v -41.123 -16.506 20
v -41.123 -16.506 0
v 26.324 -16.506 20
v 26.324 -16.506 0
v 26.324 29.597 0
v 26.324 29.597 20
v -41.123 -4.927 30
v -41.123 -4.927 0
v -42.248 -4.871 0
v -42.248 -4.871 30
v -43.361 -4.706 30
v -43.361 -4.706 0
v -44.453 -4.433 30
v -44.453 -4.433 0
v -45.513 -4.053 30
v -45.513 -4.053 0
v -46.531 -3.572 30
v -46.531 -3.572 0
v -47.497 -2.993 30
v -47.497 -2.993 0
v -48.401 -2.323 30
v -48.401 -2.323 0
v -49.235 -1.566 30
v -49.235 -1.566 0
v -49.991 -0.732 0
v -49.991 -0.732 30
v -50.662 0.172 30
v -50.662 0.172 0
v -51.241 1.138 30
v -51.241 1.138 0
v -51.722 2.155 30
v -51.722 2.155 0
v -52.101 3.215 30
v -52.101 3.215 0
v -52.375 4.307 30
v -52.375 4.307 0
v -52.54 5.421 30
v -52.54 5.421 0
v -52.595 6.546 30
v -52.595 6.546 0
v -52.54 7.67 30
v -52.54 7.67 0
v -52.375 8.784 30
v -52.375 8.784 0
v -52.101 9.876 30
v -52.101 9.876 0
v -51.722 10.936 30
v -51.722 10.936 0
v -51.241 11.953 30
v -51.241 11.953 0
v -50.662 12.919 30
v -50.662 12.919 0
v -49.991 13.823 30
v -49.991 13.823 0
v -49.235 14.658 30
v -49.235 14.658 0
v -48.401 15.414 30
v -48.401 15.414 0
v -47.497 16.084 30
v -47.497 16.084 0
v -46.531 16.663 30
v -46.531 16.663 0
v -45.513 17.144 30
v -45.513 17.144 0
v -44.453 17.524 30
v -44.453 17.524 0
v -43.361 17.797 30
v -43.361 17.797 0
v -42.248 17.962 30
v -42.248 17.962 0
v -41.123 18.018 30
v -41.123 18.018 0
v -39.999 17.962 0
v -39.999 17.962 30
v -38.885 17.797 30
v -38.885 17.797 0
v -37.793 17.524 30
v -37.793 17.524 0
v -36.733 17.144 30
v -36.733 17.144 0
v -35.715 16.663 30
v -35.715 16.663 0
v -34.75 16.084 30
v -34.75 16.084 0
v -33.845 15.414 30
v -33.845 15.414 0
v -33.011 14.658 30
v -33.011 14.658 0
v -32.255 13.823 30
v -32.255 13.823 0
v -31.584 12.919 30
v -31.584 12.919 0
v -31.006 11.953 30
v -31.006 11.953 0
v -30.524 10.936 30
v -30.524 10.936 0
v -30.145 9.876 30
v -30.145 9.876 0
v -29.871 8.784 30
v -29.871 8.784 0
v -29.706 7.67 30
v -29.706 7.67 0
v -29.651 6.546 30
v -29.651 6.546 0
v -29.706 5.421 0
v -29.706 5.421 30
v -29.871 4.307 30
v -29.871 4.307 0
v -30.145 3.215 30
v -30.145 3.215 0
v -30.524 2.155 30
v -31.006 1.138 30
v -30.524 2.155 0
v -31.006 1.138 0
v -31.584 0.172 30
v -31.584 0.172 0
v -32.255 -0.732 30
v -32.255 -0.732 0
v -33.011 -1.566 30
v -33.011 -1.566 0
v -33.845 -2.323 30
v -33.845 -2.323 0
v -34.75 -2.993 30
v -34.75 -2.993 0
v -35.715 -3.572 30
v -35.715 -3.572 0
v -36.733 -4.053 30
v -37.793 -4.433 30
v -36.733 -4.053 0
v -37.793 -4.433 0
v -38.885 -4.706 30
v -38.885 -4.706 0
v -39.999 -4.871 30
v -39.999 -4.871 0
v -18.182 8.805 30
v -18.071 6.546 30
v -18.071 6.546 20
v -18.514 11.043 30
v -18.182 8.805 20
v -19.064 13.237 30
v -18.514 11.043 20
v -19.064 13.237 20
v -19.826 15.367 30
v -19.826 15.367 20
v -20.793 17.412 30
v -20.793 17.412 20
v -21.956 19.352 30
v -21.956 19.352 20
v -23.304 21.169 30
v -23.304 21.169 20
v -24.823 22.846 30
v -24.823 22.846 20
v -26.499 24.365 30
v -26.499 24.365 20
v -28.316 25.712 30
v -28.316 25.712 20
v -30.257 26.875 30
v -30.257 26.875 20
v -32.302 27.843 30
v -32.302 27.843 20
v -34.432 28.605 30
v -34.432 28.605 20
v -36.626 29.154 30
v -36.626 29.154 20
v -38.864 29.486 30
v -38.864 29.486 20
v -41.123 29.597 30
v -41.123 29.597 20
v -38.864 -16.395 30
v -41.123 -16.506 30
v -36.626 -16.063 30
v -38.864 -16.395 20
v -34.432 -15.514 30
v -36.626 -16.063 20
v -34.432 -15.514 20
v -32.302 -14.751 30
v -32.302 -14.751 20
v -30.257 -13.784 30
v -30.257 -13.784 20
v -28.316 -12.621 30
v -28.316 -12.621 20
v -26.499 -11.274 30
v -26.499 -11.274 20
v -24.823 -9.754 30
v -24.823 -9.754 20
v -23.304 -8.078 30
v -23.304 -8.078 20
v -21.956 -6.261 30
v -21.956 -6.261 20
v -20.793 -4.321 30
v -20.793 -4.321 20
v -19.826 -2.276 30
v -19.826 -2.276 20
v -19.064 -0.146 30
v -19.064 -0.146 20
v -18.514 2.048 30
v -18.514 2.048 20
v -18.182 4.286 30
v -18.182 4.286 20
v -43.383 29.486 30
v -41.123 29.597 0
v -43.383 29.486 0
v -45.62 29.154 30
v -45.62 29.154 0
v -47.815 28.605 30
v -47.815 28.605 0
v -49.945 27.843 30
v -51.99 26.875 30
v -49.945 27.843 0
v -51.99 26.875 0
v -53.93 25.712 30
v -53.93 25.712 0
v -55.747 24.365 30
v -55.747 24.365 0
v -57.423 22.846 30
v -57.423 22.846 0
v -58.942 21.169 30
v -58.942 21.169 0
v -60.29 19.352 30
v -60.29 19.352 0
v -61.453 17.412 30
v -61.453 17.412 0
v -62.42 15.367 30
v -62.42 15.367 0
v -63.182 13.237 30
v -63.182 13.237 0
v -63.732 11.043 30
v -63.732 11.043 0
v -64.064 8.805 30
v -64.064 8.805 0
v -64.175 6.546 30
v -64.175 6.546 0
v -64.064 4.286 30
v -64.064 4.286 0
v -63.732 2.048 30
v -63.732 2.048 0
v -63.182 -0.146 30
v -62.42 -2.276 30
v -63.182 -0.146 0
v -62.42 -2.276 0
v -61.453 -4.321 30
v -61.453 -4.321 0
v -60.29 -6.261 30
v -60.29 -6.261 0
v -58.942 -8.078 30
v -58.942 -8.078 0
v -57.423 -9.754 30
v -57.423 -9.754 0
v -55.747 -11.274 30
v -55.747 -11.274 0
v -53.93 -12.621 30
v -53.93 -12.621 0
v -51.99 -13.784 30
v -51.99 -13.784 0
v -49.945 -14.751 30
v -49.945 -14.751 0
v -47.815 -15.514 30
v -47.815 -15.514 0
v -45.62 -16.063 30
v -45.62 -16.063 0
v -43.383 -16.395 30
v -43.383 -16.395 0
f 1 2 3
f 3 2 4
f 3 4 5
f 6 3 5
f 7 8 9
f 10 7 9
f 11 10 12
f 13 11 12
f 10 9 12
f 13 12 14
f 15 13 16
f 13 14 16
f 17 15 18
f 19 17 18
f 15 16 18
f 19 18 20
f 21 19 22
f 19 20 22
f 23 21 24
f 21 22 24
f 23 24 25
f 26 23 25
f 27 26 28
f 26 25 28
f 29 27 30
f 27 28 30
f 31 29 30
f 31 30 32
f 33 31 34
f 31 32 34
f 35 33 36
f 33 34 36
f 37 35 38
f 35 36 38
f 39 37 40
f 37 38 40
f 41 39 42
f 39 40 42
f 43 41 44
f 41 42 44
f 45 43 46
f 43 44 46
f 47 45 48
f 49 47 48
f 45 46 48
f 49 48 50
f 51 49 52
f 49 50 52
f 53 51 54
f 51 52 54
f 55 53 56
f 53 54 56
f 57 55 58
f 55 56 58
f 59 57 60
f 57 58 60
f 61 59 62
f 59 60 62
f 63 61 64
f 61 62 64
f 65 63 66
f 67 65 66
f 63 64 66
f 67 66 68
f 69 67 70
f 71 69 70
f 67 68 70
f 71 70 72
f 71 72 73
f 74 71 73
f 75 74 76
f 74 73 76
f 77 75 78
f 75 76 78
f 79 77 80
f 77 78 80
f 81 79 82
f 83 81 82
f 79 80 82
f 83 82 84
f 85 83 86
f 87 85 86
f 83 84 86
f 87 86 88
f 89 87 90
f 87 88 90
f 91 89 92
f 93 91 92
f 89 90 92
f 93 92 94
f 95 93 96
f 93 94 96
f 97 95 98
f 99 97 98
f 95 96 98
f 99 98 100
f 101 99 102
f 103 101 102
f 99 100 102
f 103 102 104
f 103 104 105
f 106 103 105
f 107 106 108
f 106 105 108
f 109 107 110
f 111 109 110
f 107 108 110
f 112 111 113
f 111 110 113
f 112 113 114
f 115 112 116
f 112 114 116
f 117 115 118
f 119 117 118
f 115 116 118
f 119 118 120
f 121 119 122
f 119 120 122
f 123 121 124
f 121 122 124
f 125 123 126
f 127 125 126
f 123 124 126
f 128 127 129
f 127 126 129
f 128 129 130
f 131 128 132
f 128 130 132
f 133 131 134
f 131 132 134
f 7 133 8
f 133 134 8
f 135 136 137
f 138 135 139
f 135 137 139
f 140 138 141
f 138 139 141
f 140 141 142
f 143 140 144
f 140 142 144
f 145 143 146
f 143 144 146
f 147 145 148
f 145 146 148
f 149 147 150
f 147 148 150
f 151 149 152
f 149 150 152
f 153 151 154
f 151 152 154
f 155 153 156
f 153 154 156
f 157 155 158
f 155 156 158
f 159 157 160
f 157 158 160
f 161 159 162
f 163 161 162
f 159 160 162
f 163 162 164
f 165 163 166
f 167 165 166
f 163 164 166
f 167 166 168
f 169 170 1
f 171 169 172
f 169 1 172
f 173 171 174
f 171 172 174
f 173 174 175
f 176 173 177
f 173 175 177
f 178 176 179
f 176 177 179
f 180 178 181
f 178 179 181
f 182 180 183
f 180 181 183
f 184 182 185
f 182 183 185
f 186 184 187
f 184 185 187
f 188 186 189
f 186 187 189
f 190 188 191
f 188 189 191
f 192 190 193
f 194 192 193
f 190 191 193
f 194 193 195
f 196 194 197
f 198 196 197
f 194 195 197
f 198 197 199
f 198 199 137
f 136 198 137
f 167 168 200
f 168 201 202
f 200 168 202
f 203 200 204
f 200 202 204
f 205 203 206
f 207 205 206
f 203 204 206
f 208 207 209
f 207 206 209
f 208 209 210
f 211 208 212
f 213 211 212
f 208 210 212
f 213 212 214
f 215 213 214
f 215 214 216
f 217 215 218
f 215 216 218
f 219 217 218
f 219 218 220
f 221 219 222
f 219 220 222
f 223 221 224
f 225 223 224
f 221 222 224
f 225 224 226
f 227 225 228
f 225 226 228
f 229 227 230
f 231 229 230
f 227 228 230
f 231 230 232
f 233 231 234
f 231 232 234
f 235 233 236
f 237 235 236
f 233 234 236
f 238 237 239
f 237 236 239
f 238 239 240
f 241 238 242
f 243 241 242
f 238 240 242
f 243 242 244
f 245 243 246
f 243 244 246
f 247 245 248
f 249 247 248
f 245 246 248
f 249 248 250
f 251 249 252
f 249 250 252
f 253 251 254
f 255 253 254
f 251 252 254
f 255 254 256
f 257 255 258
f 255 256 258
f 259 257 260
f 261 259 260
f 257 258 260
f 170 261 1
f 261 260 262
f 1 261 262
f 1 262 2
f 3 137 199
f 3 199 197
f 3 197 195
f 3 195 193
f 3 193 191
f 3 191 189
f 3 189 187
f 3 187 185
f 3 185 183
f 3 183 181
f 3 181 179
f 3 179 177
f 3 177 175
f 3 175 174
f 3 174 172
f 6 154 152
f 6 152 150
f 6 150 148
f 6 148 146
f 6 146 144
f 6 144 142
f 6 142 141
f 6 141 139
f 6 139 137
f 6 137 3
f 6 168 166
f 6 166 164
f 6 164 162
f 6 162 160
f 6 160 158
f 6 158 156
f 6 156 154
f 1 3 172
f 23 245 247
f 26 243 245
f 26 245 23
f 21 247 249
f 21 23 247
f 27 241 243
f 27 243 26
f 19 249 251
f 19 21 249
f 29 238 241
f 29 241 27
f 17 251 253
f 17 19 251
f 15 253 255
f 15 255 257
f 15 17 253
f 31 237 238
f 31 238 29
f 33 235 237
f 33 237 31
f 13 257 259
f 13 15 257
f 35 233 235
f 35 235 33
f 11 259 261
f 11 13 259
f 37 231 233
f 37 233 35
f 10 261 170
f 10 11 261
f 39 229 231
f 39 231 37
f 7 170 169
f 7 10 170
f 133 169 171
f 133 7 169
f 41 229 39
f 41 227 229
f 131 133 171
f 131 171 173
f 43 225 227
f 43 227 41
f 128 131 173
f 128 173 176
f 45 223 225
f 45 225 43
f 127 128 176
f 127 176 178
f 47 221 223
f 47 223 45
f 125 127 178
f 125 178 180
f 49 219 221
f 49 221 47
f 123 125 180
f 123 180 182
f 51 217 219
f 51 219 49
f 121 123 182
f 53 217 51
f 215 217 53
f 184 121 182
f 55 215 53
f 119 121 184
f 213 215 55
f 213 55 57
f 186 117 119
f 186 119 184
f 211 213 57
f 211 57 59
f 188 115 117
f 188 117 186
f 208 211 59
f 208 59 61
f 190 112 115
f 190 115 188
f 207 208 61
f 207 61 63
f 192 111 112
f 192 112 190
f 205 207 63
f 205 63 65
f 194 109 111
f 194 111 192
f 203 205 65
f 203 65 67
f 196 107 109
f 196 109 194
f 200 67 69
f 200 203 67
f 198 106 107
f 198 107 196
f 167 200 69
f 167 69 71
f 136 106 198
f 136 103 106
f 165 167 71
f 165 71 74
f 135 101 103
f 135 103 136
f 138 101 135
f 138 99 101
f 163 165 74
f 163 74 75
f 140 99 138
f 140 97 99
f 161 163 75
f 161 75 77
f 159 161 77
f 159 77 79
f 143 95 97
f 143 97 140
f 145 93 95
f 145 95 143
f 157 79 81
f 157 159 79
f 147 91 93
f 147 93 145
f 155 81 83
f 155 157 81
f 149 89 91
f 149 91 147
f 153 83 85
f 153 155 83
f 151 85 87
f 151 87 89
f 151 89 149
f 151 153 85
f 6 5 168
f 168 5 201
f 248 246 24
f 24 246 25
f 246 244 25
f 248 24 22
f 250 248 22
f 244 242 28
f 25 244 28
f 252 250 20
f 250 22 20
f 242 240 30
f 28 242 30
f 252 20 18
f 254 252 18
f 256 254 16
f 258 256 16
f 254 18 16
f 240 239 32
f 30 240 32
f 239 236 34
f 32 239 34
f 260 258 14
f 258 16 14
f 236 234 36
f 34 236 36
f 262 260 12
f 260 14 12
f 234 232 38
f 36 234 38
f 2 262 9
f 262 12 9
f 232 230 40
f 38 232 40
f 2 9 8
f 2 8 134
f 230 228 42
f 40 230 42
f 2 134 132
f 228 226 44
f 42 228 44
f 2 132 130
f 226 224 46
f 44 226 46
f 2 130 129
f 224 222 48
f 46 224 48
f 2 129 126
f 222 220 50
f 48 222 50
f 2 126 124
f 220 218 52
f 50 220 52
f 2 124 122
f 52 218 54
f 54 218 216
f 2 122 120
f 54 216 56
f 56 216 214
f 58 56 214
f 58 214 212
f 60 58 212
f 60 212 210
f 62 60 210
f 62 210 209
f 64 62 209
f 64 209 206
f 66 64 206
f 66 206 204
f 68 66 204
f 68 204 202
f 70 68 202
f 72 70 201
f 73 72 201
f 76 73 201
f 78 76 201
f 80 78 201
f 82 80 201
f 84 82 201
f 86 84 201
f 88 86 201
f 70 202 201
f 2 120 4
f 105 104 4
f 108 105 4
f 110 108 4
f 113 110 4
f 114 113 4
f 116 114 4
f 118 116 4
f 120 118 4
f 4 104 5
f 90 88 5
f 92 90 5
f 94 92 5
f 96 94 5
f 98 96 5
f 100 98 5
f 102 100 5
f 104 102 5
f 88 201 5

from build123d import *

# Parameters (mm, degrees)
F1_DEPTH = 20
F2_DEPTH = 30


with BuildPart() as f1:
    # F0 (on Top) → F1 (new body)
    with BuildSketch(Plane.XY):
        with BuildLine():
            Line((26.324494, 29.597269), (-41.123118, 29.597269))
            ThreePointArc((-41.123118, 29.597269), (-24.823095, 22.845579), (-18.071405, 6.545556))
            ThreePointArc((-18.071405, 6.545556), (-24.823095, -9.754467), (-41.123118, -16.506158))
            Line((-41.123118, -16.506158), (26.324494, -16.506158))
            Line((26.324494, -16.506158), (26.324494, 29.597269))
        make_face()
        with BuildLine():
            Line((-41.123118, 18.017708), (-41.123118, 29.597269))
            ThreePointArc((-41.123118, 29.597269), (-64.174832, 6.545556), (-41.123118, -16.506158))
            Line((-41.123118, -16.506158), (-41.123118, -4.926596))
            ThreePointArc((-41.123118, -4.926596), (-52.59527, 6.545556), (-41.123118, 18.017708))
        make_face()
    extrude(amount=F1_DEPTH)

    # F0 (on Top) → F2 (join)
    with BuildSketch(Plane.XY):
        with BuildLine():
            Line((-41.123118, 18.017708), (-41.123118, 29.597269))
            ThreePointArc((-41.123118, 29.597269), (-64.174832, 6.545556), (-41.123118, -16.506158))
            Line((-41.123118, -16.506158), (-41.123118, -4.926596))
            ThreePointArc((-41.123118, -4.926596), (-52.59527, 6.545556), (-41.123118, 18.017708))
        make_face()
        with BuildLine():
            ThreePointArc((-18.071405, 6.545556), (-24.823095, 22.845579), (-41.123118, 29.597269))
            Line((-41.123118, 29.597269), (-41.123118, 18.017708))
            ThreePointArc((-41.123118, 18.017708), (-33.011082, 14.657592), (-29.650966, 6.545556))
            ThreePointArc((-29.650966, 6.545556), (-33.011082, -1.566481), (-41.123118, -4.926596))
            Line((-41.123118, -4.926596), (-41.123118, -16.506158))
            ThreePointArc((-41.123118, -16.506158), (-24.823095, -9.754467), (-18.071405, 6.545556))
        make_face()
    extrude(amount=F2_DEPTH)


solid = f1.part
